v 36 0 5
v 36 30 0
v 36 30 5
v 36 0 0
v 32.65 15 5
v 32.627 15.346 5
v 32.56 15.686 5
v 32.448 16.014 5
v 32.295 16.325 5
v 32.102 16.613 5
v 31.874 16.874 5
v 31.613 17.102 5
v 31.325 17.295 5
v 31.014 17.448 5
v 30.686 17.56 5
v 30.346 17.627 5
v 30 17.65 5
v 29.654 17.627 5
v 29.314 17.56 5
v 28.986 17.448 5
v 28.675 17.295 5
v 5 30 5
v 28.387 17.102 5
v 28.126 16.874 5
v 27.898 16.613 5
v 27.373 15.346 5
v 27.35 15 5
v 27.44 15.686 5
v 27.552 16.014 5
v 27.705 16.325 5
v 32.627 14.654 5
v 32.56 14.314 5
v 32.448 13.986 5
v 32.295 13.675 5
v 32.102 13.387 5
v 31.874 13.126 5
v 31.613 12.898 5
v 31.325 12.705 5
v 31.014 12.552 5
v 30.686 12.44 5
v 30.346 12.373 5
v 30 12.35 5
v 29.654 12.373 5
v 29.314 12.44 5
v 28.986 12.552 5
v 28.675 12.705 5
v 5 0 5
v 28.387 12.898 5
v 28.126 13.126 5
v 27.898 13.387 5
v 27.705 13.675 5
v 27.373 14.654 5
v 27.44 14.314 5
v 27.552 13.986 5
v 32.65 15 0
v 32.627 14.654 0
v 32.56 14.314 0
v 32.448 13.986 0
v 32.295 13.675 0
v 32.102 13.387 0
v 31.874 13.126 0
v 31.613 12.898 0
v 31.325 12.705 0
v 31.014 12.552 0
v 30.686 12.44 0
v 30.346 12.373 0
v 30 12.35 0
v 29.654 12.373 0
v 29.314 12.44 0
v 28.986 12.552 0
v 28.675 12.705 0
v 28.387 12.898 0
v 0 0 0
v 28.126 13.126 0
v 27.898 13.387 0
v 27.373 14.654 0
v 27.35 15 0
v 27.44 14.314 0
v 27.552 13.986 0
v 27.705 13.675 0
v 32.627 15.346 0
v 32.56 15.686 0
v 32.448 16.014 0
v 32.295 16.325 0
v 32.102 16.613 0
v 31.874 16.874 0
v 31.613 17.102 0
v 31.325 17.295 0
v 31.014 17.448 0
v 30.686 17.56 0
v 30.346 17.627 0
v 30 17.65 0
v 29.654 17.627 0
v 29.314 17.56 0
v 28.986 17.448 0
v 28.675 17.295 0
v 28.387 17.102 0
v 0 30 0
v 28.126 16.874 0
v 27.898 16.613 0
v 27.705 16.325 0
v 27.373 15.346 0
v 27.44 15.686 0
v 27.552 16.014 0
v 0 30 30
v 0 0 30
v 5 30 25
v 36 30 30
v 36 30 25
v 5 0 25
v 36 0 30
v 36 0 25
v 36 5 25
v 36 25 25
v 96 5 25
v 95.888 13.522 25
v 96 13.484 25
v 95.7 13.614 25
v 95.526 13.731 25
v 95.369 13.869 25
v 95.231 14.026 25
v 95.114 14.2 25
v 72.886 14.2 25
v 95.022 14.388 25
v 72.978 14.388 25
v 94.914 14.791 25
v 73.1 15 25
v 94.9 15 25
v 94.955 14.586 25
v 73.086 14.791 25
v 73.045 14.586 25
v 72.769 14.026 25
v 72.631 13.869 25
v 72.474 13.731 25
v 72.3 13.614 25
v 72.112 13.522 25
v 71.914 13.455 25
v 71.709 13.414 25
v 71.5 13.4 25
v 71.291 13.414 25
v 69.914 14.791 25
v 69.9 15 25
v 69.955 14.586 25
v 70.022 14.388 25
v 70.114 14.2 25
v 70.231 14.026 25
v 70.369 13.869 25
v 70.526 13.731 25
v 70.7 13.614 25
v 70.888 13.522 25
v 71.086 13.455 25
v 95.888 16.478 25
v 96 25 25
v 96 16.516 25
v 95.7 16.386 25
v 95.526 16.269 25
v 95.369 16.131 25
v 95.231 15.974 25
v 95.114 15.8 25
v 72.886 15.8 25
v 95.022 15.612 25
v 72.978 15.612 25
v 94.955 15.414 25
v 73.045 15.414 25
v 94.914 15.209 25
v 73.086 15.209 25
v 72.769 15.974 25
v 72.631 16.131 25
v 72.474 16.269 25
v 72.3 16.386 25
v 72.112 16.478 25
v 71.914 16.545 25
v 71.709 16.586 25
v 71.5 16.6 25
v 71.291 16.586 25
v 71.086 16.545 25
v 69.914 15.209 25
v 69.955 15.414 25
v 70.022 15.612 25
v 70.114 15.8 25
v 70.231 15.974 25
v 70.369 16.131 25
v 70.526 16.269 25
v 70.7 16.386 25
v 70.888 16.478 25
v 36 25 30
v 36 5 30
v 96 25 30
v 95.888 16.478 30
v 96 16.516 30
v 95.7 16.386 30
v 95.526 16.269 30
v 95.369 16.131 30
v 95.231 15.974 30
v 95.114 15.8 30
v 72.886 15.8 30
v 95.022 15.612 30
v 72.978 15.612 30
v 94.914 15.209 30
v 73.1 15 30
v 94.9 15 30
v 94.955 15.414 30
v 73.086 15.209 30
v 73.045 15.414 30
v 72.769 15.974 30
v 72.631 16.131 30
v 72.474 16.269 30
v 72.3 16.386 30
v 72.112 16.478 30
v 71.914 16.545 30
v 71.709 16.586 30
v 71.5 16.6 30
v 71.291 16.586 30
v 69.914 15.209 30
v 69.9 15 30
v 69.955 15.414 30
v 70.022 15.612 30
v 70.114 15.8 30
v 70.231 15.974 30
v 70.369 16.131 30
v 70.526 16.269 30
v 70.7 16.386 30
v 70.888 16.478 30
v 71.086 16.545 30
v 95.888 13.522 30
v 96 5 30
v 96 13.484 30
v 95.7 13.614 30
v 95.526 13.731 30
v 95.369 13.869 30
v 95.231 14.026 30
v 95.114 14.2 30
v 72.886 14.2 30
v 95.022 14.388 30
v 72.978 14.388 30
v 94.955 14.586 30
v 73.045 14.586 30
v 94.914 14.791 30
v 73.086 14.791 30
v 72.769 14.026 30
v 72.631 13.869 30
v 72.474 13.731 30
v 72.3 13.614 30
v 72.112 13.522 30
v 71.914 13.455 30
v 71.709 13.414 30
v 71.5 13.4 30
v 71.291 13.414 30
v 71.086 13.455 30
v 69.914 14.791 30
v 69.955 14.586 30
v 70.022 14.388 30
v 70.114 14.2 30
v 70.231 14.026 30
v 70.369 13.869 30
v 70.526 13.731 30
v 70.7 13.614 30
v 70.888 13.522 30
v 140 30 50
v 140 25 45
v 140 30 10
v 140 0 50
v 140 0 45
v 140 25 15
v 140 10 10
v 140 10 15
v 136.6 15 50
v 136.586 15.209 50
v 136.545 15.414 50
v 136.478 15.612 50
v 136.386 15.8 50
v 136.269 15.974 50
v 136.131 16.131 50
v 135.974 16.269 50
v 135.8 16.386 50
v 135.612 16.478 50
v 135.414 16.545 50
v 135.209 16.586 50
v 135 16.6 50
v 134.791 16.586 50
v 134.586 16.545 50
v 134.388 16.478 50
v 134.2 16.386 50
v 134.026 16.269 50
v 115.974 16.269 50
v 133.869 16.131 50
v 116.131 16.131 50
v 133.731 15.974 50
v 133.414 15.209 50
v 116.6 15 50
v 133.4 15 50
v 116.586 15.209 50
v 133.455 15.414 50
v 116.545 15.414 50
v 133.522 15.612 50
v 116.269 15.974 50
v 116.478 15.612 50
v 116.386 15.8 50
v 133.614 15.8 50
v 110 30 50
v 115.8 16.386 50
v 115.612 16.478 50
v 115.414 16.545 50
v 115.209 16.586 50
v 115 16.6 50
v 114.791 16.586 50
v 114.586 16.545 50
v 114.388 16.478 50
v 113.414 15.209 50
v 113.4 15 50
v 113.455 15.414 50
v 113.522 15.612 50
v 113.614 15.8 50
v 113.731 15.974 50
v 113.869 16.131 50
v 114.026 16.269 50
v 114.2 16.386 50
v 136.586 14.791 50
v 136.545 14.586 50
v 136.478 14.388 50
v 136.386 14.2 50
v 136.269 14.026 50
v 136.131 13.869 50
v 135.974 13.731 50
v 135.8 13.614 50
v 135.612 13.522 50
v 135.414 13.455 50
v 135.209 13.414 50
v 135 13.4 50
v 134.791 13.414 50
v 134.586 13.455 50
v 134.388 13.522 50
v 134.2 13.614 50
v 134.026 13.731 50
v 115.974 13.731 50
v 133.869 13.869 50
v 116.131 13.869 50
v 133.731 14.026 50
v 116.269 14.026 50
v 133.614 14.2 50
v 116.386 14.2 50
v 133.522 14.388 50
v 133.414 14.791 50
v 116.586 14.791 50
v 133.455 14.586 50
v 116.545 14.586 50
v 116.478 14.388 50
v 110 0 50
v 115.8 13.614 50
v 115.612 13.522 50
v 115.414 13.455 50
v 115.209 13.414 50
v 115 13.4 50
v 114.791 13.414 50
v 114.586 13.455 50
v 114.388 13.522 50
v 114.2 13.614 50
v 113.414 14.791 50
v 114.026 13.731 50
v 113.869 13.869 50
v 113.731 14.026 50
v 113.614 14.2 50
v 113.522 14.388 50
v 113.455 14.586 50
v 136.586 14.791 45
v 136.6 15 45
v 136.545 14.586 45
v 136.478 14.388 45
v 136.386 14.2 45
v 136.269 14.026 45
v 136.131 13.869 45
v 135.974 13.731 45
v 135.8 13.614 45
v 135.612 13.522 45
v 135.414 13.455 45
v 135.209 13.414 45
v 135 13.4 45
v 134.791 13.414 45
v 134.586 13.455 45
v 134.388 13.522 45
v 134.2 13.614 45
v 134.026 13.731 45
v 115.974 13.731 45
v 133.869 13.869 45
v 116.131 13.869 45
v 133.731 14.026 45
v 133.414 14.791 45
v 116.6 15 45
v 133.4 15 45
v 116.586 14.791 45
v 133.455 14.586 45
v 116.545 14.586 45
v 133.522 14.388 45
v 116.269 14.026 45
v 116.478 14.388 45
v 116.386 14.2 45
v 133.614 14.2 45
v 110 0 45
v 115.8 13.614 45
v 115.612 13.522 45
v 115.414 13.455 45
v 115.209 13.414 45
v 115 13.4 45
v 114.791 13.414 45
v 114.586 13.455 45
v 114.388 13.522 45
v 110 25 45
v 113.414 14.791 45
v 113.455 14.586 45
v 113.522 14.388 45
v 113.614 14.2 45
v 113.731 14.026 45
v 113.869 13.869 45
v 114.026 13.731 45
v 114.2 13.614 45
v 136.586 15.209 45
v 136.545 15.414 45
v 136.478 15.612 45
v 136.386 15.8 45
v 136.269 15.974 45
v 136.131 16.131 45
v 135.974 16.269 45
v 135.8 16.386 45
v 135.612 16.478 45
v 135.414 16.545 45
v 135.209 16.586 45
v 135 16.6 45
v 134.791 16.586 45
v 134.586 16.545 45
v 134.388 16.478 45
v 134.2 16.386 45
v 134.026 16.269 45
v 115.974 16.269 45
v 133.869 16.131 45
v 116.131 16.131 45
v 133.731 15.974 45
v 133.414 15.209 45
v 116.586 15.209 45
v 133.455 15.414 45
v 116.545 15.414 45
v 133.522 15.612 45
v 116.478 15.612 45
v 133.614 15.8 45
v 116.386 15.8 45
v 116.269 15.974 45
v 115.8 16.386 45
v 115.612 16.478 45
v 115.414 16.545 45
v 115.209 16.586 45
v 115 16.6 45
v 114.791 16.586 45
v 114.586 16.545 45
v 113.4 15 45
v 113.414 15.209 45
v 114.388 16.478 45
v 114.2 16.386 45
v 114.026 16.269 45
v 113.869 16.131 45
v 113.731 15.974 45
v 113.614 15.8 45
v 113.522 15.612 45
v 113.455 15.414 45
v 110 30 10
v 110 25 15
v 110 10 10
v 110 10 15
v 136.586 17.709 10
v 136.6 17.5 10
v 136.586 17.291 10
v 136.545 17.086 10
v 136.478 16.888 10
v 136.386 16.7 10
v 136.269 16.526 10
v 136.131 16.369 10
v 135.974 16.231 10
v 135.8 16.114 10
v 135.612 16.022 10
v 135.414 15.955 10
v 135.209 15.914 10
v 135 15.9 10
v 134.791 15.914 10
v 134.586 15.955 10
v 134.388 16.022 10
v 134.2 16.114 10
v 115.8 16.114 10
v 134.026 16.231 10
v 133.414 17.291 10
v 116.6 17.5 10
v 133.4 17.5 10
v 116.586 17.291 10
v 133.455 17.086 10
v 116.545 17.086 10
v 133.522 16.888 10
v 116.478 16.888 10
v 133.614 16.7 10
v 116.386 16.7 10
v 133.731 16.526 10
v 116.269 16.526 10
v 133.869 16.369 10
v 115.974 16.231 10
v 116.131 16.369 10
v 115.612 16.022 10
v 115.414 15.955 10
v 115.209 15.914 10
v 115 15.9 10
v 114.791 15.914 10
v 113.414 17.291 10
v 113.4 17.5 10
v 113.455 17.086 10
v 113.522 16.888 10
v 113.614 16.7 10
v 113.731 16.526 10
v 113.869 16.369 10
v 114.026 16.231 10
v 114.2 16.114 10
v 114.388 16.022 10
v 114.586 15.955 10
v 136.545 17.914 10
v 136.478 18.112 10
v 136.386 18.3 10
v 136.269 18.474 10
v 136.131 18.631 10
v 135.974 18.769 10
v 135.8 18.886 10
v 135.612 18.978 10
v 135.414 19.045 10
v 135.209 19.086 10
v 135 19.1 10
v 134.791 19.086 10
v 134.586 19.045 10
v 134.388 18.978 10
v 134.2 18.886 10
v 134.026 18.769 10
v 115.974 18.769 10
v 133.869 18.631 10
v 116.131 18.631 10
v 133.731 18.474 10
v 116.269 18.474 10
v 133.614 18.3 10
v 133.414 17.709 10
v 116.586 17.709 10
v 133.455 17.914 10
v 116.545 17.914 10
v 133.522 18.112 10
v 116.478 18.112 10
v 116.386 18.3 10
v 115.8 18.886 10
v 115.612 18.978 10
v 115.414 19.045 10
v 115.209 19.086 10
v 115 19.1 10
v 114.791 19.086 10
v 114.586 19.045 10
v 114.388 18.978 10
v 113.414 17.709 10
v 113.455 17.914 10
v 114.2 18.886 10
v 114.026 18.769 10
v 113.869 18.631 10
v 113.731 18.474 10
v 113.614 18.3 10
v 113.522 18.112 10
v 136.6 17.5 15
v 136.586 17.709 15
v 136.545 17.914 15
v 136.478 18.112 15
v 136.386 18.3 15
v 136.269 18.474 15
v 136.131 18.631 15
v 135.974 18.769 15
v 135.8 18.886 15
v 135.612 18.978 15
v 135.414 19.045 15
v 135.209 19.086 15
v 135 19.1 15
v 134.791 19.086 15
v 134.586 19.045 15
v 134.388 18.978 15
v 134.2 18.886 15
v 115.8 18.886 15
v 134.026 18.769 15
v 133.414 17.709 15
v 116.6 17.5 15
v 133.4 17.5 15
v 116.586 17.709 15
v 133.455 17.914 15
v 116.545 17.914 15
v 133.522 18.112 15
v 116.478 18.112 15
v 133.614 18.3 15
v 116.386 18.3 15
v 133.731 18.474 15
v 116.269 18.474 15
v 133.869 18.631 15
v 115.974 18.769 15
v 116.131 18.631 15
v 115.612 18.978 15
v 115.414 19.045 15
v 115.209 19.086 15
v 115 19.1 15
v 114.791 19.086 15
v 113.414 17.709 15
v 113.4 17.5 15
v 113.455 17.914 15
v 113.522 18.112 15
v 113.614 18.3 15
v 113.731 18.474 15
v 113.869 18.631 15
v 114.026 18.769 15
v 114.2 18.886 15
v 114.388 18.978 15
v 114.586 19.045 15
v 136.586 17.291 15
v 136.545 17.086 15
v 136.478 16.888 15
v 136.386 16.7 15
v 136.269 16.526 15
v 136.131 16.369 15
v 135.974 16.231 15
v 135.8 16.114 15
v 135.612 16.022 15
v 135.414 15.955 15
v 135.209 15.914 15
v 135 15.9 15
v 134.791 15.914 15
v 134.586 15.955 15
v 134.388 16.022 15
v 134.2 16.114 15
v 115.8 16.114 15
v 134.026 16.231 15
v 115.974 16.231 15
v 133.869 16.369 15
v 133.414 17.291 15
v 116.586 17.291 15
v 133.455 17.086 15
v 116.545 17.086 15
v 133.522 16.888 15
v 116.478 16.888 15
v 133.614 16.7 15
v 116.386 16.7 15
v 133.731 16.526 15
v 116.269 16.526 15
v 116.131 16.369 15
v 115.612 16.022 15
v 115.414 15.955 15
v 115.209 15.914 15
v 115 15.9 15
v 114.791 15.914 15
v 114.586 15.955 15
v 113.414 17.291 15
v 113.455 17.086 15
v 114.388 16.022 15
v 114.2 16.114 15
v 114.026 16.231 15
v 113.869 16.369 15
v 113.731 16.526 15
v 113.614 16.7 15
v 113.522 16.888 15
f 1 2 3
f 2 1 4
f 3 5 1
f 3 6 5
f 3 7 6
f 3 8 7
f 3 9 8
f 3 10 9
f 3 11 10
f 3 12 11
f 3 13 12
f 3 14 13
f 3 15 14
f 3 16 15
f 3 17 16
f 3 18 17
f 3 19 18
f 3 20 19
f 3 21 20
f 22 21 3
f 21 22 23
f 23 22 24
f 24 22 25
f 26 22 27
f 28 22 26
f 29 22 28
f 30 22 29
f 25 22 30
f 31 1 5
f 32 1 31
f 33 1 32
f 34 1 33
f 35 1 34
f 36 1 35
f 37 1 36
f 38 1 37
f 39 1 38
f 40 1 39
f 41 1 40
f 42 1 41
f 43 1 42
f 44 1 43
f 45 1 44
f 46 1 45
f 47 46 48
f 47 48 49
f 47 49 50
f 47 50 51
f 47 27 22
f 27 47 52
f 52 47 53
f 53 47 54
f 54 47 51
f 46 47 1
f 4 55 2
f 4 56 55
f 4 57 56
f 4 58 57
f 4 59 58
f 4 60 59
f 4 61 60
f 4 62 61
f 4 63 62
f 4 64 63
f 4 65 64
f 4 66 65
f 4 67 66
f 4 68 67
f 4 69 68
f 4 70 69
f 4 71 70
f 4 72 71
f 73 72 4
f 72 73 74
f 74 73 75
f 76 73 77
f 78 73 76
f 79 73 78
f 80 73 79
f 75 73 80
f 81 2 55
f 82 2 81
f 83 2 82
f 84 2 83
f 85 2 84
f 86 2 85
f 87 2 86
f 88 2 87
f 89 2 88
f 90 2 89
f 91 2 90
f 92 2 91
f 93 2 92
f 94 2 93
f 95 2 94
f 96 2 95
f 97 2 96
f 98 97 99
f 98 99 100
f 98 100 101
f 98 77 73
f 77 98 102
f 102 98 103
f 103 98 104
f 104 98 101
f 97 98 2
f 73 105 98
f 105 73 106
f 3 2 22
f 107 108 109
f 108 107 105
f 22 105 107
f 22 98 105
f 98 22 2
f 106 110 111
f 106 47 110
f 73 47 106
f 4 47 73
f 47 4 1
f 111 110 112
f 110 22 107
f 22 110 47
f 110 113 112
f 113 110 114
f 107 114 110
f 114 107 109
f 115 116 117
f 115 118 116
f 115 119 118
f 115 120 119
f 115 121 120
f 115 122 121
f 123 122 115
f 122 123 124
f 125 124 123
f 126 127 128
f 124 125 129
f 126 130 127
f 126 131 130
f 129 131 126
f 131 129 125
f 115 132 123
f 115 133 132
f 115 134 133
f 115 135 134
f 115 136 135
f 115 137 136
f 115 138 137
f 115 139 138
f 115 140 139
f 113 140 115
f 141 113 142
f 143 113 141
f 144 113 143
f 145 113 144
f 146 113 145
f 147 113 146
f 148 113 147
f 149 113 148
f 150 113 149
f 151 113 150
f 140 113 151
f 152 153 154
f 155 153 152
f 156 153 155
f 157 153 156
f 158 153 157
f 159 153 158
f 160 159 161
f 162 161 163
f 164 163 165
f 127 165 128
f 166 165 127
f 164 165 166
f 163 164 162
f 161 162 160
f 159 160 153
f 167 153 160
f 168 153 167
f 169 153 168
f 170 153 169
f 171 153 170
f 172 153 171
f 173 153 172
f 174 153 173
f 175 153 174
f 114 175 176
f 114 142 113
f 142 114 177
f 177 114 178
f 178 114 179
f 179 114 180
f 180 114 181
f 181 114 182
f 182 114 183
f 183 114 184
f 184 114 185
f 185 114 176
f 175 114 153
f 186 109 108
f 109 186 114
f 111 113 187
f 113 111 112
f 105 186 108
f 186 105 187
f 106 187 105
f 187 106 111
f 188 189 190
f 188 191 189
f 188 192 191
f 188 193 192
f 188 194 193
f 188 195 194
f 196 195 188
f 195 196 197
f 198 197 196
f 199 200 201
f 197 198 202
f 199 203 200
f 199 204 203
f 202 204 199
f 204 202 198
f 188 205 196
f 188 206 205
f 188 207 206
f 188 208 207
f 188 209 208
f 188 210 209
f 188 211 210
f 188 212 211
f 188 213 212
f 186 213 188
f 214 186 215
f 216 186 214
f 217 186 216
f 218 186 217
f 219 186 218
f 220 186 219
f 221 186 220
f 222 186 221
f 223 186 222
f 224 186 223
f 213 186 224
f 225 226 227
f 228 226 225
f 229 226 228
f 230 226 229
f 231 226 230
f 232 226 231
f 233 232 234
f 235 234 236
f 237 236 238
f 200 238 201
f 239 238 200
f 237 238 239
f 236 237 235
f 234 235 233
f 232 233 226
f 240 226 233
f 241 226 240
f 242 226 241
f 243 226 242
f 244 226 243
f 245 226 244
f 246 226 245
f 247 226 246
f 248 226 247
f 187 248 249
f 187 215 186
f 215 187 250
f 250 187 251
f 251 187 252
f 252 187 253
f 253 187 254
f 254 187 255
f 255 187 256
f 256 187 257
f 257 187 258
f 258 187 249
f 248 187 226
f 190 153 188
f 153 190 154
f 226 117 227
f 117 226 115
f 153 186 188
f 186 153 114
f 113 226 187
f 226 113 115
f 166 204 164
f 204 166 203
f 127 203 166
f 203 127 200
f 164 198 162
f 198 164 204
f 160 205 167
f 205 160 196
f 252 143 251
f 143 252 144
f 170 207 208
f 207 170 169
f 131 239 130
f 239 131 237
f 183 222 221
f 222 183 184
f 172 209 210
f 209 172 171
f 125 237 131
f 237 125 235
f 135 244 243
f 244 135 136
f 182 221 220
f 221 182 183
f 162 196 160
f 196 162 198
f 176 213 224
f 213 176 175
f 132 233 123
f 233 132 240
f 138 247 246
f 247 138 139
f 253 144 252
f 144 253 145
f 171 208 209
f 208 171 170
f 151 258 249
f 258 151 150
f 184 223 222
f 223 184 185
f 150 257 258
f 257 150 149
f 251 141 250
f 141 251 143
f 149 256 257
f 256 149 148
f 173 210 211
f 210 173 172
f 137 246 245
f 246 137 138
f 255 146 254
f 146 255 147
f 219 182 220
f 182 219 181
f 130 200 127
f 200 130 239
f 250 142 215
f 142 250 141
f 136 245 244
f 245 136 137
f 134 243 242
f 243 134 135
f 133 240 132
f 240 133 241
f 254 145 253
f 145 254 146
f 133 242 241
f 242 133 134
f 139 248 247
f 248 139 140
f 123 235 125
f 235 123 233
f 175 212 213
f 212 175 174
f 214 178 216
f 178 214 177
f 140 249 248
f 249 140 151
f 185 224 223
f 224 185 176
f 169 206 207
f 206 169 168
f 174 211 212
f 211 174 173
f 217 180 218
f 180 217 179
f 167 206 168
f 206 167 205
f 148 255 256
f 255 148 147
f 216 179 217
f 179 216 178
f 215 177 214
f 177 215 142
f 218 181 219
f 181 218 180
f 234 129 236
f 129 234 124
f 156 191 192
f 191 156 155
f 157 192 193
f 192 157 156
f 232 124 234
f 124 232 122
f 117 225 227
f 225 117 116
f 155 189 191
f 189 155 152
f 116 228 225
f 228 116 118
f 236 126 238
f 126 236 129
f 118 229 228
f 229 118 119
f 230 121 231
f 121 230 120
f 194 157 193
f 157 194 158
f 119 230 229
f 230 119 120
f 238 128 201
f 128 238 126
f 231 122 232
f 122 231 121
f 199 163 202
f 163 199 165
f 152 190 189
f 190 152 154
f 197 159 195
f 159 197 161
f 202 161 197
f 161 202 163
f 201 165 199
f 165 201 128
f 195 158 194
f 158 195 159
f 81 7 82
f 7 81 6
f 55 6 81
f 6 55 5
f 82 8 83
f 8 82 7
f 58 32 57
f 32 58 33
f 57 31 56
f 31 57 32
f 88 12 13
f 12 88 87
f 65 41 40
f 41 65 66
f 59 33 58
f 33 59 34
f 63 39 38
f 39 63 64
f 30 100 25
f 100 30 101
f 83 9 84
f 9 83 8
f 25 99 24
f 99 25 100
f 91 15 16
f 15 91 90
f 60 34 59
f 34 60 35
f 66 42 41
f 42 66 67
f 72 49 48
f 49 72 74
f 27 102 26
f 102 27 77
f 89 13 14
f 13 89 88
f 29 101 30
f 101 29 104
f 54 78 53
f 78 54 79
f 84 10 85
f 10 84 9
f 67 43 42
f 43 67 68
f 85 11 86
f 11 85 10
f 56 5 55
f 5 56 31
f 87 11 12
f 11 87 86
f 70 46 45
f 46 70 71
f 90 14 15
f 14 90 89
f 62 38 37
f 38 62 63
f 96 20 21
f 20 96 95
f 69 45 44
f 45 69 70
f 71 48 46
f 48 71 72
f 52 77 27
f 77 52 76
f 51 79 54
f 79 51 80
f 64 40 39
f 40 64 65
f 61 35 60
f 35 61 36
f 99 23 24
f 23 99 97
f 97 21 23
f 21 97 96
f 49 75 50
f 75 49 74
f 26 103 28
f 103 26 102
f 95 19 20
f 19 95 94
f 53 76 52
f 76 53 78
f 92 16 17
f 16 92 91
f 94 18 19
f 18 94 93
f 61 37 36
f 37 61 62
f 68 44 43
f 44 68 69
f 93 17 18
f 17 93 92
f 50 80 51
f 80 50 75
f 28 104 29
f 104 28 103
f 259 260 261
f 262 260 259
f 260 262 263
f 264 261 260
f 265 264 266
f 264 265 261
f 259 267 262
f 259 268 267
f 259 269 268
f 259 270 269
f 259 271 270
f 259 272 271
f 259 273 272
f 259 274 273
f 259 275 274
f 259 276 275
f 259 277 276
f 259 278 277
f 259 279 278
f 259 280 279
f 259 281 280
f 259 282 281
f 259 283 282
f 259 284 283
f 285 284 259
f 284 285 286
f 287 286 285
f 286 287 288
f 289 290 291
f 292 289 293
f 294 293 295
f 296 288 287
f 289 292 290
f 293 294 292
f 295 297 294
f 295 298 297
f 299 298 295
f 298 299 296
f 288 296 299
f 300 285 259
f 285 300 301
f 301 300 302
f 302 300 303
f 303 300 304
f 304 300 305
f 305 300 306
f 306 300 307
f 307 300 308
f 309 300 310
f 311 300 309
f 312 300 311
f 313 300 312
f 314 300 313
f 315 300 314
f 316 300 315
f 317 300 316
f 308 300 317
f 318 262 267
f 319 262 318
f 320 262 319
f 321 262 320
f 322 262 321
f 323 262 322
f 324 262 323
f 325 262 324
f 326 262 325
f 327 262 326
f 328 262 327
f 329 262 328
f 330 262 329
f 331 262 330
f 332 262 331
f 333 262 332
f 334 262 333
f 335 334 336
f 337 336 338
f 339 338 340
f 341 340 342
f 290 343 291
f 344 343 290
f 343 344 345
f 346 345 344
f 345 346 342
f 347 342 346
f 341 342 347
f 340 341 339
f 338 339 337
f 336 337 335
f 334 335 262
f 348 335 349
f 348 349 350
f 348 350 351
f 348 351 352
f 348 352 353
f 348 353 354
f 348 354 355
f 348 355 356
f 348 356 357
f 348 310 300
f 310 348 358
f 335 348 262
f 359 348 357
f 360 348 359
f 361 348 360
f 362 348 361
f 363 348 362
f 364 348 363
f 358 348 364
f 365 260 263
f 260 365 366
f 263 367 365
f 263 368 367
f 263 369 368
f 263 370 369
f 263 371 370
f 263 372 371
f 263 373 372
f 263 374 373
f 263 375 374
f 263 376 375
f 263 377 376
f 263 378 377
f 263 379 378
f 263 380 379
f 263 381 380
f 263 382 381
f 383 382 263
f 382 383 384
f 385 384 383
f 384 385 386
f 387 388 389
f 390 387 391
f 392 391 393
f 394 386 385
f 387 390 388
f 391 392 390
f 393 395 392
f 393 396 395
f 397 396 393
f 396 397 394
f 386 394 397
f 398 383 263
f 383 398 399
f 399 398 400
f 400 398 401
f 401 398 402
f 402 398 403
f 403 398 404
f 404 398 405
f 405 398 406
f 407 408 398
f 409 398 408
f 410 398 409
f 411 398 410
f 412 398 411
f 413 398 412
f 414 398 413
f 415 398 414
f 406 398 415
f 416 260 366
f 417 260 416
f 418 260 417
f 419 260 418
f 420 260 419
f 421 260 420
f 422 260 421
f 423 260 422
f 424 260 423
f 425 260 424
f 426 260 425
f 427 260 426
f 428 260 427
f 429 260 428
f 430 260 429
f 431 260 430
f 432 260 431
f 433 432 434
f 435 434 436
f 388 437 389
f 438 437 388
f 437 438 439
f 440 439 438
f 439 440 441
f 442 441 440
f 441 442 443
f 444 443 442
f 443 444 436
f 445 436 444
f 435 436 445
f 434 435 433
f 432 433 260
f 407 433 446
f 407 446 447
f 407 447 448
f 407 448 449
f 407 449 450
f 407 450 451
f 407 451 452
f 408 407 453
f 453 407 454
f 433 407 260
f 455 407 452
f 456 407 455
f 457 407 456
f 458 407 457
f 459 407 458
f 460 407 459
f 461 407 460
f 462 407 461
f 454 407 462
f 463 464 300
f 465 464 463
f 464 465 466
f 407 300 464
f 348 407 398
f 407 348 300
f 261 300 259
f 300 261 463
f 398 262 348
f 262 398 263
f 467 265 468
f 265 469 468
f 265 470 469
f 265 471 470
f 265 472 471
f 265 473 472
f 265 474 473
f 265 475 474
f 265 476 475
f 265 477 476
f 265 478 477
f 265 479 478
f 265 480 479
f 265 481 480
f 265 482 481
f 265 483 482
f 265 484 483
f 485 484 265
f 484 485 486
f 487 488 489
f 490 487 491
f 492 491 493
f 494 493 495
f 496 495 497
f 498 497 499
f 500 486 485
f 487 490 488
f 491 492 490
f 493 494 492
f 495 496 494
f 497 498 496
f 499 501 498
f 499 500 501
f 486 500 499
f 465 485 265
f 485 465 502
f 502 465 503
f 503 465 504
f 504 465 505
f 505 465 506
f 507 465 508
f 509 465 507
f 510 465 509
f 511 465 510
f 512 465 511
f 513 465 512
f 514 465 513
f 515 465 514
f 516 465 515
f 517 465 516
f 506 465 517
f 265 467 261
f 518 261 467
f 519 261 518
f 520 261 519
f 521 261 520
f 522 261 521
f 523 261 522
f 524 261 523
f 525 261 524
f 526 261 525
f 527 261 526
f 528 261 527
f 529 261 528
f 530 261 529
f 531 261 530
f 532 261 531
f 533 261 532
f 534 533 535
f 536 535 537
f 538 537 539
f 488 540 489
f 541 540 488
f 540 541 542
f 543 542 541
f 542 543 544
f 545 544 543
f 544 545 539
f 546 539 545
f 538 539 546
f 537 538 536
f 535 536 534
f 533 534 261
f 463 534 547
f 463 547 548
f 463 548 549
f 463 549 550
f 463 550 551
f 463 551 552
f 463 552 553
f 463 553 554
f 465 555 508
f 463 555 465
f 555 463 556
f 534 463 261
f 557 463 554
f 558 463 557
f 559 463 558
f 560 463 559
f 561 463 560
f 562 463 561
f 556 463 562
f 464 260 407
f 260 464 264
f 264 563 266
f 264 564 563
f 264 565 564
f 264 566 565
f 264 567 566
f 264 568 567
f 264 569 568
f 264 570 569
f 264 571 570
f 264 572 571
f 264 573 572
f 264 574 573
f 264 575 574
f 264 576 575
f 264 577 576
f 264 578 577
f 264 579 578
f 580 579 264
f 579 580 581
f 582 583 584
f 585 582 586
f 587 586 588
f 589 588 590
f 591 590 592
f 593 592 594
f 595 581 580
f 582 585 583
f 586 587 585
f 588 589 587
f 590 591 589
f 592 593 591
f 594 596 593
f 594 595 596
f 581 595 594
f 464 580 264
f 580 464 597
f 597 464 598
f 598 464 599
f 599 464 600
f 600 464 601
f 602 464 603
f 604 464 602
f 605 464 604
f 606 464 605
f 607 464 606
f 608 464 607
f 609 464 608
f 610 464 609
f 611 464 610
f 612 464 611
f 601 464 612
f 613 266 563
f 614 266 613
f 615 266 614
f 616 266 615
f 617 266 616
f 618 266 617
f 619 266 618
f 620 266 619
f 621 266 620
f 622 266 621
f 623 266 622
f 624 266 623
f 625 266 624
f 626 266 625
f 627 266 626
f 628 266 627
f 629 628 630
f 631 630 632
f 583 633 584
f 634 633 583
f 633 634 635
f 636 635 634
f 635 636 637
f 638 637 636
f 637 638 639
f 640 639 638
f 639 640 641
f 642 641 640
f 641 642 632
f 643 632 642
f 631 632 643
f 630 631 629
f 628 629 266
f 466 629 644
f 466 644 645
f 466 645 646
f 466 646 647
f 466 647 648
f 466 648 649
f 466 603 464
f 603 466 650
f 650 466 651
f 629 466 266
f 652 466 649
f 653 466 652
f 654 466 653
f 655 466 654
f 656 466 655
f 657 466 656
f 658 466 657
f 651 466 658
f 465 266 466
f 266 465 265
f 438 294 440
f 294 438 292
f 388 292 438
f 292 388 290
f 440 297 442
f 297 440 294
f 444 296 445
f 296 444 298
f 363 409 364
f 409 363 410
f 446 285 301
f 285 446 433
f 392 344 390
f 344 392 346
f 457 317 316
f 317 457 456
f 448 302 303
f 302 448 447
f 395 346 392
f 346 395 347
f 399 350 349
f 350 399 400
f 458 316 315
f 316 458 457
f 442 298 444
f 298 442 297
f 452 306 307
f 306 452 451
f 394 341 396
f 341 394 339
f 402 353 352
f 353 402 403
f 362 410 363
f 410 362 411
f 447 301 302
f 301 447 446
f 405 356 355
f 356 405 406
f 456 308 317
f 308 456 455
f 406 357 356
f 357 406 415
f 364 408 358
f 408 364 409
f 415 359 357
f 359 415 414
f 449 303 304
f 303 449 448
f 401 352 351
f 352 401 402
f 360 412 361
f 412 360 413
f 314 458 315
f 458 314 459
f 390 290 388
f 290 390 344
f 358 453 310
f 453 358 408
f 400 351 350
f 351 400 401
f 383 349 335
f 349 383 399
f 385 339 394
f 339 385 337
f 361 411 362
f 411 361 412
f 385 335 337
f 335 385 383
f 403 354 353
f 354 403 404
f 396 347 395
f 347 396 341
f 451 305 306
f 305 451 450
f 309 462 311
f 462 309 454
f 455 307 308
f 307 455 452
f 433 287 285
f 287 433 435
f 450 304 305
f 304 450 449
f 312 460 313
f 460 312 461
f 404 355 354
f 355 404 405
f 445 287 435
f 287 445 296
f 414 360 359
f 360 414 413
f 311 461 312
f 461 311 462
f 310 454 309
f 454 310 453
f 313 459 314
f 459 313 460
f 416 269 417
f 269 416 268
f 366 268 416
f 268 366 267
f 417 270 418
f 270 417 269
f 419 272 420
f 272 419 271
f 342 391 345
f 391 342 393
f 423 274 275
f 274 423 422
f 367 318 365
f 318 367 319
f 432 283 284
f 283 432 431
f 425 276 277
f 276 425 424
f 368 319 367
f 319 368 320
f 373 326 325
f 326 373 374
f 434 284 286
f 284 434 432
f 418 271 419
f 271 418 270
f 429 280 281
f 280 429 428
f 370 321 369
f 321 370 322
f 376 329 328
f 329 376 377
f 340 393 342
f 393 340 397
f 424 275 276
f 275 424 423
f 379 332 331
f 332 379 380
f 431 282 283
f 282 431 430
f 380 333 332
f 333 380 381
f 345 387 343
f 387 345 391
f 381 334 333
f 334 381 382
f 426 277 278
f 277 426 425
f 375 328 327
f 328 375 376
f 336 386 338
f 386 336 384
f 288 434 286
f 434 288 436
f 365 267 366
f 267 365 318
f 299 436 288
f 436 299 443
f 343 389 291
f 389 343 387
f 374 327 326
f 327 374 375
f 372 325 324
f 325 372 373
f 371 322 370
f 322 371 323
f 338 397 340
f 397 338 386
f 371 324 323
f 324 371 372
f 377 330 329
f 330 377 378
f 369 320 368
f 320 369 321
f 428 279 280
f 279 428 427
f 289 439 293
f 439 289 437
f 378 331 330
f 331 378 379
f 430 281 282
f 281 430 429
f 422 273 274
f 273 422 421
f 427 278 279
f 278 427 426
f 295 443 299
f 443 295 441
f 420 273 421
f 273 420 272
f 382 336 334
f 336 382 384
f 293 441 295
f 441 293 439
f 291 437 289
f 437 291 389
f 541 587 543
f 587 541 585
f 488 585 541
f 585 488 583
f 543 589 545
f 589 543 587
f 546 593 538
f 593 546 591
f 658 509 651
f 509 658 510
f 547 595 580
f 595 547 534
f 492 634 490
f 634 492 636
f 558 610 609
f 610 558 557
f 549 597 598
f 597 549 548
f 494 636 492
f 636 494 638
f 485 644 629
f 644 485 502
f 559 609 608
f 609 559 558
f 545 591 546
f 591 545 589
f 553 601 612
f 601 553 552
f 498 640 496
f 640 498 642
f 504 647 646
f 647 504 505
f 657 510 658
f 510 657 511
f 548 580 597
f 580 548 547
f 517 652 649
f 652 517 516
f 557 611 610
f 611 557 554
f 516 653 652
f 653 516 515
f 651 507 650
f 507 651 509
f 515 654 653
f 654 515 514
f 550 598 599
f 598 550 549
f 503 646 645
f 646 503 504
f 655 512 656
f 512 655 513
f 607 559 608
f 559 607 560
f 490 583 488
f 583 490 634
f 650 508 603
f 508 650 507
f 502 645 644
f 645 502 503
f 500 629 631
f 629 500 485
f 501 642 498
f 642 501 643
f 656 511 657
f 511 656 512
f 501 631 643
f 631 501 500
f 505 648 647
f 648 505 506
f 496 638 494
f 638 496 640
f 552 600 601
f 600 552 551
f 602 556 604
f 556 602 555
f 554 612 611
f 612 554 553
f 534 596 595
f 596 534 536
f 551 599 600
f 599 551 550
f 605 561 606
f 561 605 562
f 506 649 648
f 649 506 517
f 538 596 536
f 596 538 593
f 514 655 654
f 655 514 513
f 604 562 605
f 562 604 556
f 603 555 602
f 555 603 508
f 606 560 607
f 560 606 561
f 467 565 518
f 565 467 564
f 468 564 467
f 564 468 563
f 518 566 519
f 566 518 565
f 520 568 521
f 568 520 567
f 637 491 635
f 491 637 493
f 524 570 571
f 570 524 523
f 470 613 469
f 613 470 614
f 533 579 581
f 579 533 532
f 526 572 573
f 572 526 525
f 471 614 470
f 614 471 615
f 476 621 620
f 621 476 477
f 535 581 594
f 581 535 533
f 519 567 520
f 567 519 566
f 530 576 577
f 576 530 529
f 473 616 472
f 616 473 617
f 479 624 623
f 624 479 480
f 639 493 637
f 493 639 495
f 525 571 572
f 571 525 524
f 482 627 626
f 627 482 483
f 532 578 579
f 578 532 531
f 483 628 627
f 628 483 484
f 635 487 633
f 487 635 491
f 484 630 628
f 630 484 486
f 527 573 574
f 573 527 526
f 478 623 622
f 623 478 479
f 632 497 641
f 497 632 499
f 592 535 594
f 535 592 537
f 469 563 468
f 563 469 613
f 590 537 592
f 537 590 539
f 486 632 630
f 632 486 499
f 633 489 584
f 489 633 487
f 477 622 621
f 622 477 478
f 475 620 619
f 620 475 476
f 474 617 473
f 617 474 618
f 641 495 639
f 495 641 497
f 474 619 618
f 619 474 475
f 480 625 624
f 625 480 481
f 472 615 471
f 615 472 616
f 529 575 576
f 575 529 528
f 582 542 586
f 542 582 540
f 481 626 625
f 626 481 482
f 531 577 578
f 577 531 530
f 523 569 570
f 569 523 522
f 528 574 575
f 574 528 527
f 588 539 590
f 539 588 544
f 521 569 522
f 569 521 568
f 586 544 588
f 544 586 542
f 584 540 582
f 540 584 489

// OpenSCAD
// file: 00_config.scad
// 00_config.scad — shared dimensions for the AndroidTester machine, in mm.
//
// These constants are the single source for every part in cad/openscad/.
// They are cross-checked by tests/test_design_package.py against
// androidtester/config.py (deck size, clearance planes) and
// firmware/klipper/androidtester.cfg (position_max) — change them together.

// -- deck and travels -------------------------------------------------------
// Deck == reachable XY (cfg position_max == config.py deck defaults).
DECK_W   = 400;          // deck X, config.py deck_width_mm, stepper_x position_max
DECK_D   = 300;          // deck Y, config.py deck_height_mm, stepper_y position_max
X_TRAVEL = 400;          // == DECK_W
Y_TRAVEL = 300;          // == DECK_D
Z_TRAVEL = 60;           // tool-Z elevator travel (manual_stepper tool_z)
TRAVEL_Z = 40;           // clearance plane, config.py travel_z_mm
TOUCH_Z  = 5;            // finger-tip contact plane, config.py touch_z_mm

// -- linear rails -------------------------------------------------------------
// X rail: must span the full X travel plus the carriage plus end margins:
//   X_TRAVEL (400) + X_CARRIAGE_LEN (45) + 2*END_MARGIN (10) = 465 mm min
//   -> RAIL_X_LEN = 500 (next stock MGN12 length, 35 mm of setup slack).
// Y rails (x2, carry the gantry beam):
//   Y_TRAVEL (300) + X_CARRIAGE_LEN (45) + 2*END_MARGIN (10) = 365 mm min
//   -> RAIL_Y_LEN = 400.
// Z rail (tool elevator, MGN9):
//   Z_TRAVEL (60) + Z_CARRIAGE_LEN (40) + 2*END_MARGIN (10) = 120 mm min
//   -> RAIL_Z_LEN = 150.
RAIL_X_LEN = 500;
RAIL_Y_LEN = 400;
RAIL_Z_LEN = 150;
X_CARRIAGE_LEN = 45;     // MGN12H block, 27 x 45.4 mm (nominal — verify rail vendor)
Z_CARRIAGE_LEN = 40;     // MGN9H block, 20 x 38.9 mm (nominal — verify rail vendor)
END_MARGIN   = 10;       // endstop trigger + belt/idler clearance at each rail end
RAIL12_W = 12;           // MGN12 rail width / height
RAIL12_H = 8;
RAIL9_W  = 9;            // MGN9 rail width / height
RAIL9_H  = 6.5;

// -- frame --------------------------------------------------------------------
EXT = 20;                // 2020 aluminium extrusion (6 mm slot)
FRAME_W = DECK_W + 100;  // 500 — gantry beam carries the full X rail (500)
FRAME_D = DECK_D + 100;  // 400 — side beams carry the full Y rails (400)
POST_H  = 200;           // gantry posts above the base frame
CAM_POST_H = 400;        // overhead camera post above the deck

// -- motors / motion hardware ---------------------------------------------------
NEMA_W   = 42.3;         // NEMA17 face
NEMA_HOLE_SP = 31;       // NEMA17 M3 hole spacing
NEMA_BORE  = 22.2;       // NEMA17 pilot bore (clearance)
PULLEY_D = 12.2;         // GT2 20T pulley OD (2 mm pitch x 20 T = 40 mm/rev)
IDLER_D  = 12.2;         // GT2 20T idler OD, 5 mm bore
BELT_W   = 6;            // GT2 belt width
LEAD_D   = 8;            // T8 lead screw (2 mm pitch x 4 starts = 8 mm/rev)

// -- servos (SG90 / MG90S class) -------------------------------------------------
SERVO_W   = 23;          // body across tabs axis
SERVO_D   = 12.5;        // body depth
SERVO_H   = 23;          // body height below the mounting tabs
SERVO_TAB_W = 32.5;      // across the mounting tabs
SERVO_SHAFT_D = 5;       // output shaft / horn boss clearance
SERVO_SHAFT_OFF = 6;     // shaft centre from body end wall

// -- finger tool -----------------------------------------------------------------
FINGER_TIP_D  = 8;       // conductive tip diameter
FINGER_SHAFT_D = 6;      // plunger shaft
SPRING_D  = 8.5;         // compression-spring pocket (Ø8 spring, k ≈ 0.5 N/mm)
FINGER_STROKE = 15;      // spring working stroke (3–12 mm compression -> 1.5–6 N)

// -- fasteners ---------------------------------------------------------------------
M3_CLEAR = 3.2;
M4_CLEAR = 4.2;
M5_CLEAR = 5.3;
M3_HEAD  = 6.0;          // M3 button-head clearance

// -- device nest ---------------------------------------------------------------------
DEVICE_MAX_W = 280;      // phones through ~11" tablets (250 x 170 + case)
DEVICE_MAX_D = 200;
NEST_STOP_H  = 8;        // stop height: below screen, clear of ArUco markers
NEST_CLEAR   = 40;       // keep-out at each deck corner (ArUco marker zone)

$fn = 48;
// main file
// camera_mounts.scad — machine-vision mounts.
//   overhead_clamp — clamps the rear 2020 post, holds the overhead webcam
//                    CAM_POST_H (400 mm) above the deck centre
//   toolcam_bracket — toolhead camera on the gantry plate's rear M3 pattern
//
// Export: openscad -o overhead_clamp.stl -D 'PART="overhead_clamp"' camera_mounts.scad
include <00_config.scad>

PART = is_undef(_AT_PART) ? "preview" : _AT_PART;  // -D 'PART=...' or a render wrapper overrides

module overhead_clamp() {
    w = EXT + 16;        // wraps the post with two 8 mm cheeks
    t = 5;
    arm = 60;            // camera arm toward the deck centre
    difference() {
        union() {
            // C-clamp around the 2020 post
            cube([w, EXT + 2 * t, t]);                  // jaw bottom
            translate([0, 0, t]) cube([t, EXT + 2 * t, EXT]); // spine
            translate([0, 0, t + EXT]) cube([w, EXT + 2 * t, t]); // jaw top
            // camera arm off the top jaw
            translate([w, t, t + EXT]) cube([arm, EXT, t]);
        }
        // M5 clamp screw pulling the jaws onto the post slots
        translate([w - 6, t + EXT / 2, -0.1]) cylinder(d = M5_CLEAR, h = t + 0.2);
        // webcam plate holes: 2 x M3 on 25 mm spacing at the arm end
        for (sx = [-1, 1])
            translate([w + arm - 12 + sx * 12.5, t + EXT / 2, t + EXT - 0.1])
                cylinder(d = M3_CLEAR, h = t + 0.2);
    }
}

module toolcam_bracket() {
    w = 30;
    t = 5;
    drop = 35;           // camera sits below the plate, lens past the finger
    difference() {
        union() {
            cube([w, w, t]);                             // flange to the plate
            translate([0, w - t, -drop]) cube([w, t, drop + t]); // vertical leg
            translate([0, w - t - 15, -drop]) cube([w, 15, t]); // camera shelf
        }
        // flange holes matching the toolhead plate rear pattern (20 mm)
        for (sx = [-1, 1])
            translate([w / 2 + sx * 10, w / 2, -0.1])
                cylinder(d = M3_CLEAR, h = t + 0.2);
        // camera M3 holes in the shelf
        for (sx = [-1, 1])
            translate([w / 2 + sx * 10, w - t - 7.5, -drop - 0.1])
                cylinder(d = M3_CLEAR, h = t + 0.2);
    }
}

// -- preview / selector ---------------------------------------------------------
if (PART == "preview" || PART == "overhead_clamp")
    overhead_clamp();
if (PART == "preview")
    translate([110, 0, 45]) toolcam_bracket();
else if (PART == "toolcam_bracket")
    toolcam_bracket();
